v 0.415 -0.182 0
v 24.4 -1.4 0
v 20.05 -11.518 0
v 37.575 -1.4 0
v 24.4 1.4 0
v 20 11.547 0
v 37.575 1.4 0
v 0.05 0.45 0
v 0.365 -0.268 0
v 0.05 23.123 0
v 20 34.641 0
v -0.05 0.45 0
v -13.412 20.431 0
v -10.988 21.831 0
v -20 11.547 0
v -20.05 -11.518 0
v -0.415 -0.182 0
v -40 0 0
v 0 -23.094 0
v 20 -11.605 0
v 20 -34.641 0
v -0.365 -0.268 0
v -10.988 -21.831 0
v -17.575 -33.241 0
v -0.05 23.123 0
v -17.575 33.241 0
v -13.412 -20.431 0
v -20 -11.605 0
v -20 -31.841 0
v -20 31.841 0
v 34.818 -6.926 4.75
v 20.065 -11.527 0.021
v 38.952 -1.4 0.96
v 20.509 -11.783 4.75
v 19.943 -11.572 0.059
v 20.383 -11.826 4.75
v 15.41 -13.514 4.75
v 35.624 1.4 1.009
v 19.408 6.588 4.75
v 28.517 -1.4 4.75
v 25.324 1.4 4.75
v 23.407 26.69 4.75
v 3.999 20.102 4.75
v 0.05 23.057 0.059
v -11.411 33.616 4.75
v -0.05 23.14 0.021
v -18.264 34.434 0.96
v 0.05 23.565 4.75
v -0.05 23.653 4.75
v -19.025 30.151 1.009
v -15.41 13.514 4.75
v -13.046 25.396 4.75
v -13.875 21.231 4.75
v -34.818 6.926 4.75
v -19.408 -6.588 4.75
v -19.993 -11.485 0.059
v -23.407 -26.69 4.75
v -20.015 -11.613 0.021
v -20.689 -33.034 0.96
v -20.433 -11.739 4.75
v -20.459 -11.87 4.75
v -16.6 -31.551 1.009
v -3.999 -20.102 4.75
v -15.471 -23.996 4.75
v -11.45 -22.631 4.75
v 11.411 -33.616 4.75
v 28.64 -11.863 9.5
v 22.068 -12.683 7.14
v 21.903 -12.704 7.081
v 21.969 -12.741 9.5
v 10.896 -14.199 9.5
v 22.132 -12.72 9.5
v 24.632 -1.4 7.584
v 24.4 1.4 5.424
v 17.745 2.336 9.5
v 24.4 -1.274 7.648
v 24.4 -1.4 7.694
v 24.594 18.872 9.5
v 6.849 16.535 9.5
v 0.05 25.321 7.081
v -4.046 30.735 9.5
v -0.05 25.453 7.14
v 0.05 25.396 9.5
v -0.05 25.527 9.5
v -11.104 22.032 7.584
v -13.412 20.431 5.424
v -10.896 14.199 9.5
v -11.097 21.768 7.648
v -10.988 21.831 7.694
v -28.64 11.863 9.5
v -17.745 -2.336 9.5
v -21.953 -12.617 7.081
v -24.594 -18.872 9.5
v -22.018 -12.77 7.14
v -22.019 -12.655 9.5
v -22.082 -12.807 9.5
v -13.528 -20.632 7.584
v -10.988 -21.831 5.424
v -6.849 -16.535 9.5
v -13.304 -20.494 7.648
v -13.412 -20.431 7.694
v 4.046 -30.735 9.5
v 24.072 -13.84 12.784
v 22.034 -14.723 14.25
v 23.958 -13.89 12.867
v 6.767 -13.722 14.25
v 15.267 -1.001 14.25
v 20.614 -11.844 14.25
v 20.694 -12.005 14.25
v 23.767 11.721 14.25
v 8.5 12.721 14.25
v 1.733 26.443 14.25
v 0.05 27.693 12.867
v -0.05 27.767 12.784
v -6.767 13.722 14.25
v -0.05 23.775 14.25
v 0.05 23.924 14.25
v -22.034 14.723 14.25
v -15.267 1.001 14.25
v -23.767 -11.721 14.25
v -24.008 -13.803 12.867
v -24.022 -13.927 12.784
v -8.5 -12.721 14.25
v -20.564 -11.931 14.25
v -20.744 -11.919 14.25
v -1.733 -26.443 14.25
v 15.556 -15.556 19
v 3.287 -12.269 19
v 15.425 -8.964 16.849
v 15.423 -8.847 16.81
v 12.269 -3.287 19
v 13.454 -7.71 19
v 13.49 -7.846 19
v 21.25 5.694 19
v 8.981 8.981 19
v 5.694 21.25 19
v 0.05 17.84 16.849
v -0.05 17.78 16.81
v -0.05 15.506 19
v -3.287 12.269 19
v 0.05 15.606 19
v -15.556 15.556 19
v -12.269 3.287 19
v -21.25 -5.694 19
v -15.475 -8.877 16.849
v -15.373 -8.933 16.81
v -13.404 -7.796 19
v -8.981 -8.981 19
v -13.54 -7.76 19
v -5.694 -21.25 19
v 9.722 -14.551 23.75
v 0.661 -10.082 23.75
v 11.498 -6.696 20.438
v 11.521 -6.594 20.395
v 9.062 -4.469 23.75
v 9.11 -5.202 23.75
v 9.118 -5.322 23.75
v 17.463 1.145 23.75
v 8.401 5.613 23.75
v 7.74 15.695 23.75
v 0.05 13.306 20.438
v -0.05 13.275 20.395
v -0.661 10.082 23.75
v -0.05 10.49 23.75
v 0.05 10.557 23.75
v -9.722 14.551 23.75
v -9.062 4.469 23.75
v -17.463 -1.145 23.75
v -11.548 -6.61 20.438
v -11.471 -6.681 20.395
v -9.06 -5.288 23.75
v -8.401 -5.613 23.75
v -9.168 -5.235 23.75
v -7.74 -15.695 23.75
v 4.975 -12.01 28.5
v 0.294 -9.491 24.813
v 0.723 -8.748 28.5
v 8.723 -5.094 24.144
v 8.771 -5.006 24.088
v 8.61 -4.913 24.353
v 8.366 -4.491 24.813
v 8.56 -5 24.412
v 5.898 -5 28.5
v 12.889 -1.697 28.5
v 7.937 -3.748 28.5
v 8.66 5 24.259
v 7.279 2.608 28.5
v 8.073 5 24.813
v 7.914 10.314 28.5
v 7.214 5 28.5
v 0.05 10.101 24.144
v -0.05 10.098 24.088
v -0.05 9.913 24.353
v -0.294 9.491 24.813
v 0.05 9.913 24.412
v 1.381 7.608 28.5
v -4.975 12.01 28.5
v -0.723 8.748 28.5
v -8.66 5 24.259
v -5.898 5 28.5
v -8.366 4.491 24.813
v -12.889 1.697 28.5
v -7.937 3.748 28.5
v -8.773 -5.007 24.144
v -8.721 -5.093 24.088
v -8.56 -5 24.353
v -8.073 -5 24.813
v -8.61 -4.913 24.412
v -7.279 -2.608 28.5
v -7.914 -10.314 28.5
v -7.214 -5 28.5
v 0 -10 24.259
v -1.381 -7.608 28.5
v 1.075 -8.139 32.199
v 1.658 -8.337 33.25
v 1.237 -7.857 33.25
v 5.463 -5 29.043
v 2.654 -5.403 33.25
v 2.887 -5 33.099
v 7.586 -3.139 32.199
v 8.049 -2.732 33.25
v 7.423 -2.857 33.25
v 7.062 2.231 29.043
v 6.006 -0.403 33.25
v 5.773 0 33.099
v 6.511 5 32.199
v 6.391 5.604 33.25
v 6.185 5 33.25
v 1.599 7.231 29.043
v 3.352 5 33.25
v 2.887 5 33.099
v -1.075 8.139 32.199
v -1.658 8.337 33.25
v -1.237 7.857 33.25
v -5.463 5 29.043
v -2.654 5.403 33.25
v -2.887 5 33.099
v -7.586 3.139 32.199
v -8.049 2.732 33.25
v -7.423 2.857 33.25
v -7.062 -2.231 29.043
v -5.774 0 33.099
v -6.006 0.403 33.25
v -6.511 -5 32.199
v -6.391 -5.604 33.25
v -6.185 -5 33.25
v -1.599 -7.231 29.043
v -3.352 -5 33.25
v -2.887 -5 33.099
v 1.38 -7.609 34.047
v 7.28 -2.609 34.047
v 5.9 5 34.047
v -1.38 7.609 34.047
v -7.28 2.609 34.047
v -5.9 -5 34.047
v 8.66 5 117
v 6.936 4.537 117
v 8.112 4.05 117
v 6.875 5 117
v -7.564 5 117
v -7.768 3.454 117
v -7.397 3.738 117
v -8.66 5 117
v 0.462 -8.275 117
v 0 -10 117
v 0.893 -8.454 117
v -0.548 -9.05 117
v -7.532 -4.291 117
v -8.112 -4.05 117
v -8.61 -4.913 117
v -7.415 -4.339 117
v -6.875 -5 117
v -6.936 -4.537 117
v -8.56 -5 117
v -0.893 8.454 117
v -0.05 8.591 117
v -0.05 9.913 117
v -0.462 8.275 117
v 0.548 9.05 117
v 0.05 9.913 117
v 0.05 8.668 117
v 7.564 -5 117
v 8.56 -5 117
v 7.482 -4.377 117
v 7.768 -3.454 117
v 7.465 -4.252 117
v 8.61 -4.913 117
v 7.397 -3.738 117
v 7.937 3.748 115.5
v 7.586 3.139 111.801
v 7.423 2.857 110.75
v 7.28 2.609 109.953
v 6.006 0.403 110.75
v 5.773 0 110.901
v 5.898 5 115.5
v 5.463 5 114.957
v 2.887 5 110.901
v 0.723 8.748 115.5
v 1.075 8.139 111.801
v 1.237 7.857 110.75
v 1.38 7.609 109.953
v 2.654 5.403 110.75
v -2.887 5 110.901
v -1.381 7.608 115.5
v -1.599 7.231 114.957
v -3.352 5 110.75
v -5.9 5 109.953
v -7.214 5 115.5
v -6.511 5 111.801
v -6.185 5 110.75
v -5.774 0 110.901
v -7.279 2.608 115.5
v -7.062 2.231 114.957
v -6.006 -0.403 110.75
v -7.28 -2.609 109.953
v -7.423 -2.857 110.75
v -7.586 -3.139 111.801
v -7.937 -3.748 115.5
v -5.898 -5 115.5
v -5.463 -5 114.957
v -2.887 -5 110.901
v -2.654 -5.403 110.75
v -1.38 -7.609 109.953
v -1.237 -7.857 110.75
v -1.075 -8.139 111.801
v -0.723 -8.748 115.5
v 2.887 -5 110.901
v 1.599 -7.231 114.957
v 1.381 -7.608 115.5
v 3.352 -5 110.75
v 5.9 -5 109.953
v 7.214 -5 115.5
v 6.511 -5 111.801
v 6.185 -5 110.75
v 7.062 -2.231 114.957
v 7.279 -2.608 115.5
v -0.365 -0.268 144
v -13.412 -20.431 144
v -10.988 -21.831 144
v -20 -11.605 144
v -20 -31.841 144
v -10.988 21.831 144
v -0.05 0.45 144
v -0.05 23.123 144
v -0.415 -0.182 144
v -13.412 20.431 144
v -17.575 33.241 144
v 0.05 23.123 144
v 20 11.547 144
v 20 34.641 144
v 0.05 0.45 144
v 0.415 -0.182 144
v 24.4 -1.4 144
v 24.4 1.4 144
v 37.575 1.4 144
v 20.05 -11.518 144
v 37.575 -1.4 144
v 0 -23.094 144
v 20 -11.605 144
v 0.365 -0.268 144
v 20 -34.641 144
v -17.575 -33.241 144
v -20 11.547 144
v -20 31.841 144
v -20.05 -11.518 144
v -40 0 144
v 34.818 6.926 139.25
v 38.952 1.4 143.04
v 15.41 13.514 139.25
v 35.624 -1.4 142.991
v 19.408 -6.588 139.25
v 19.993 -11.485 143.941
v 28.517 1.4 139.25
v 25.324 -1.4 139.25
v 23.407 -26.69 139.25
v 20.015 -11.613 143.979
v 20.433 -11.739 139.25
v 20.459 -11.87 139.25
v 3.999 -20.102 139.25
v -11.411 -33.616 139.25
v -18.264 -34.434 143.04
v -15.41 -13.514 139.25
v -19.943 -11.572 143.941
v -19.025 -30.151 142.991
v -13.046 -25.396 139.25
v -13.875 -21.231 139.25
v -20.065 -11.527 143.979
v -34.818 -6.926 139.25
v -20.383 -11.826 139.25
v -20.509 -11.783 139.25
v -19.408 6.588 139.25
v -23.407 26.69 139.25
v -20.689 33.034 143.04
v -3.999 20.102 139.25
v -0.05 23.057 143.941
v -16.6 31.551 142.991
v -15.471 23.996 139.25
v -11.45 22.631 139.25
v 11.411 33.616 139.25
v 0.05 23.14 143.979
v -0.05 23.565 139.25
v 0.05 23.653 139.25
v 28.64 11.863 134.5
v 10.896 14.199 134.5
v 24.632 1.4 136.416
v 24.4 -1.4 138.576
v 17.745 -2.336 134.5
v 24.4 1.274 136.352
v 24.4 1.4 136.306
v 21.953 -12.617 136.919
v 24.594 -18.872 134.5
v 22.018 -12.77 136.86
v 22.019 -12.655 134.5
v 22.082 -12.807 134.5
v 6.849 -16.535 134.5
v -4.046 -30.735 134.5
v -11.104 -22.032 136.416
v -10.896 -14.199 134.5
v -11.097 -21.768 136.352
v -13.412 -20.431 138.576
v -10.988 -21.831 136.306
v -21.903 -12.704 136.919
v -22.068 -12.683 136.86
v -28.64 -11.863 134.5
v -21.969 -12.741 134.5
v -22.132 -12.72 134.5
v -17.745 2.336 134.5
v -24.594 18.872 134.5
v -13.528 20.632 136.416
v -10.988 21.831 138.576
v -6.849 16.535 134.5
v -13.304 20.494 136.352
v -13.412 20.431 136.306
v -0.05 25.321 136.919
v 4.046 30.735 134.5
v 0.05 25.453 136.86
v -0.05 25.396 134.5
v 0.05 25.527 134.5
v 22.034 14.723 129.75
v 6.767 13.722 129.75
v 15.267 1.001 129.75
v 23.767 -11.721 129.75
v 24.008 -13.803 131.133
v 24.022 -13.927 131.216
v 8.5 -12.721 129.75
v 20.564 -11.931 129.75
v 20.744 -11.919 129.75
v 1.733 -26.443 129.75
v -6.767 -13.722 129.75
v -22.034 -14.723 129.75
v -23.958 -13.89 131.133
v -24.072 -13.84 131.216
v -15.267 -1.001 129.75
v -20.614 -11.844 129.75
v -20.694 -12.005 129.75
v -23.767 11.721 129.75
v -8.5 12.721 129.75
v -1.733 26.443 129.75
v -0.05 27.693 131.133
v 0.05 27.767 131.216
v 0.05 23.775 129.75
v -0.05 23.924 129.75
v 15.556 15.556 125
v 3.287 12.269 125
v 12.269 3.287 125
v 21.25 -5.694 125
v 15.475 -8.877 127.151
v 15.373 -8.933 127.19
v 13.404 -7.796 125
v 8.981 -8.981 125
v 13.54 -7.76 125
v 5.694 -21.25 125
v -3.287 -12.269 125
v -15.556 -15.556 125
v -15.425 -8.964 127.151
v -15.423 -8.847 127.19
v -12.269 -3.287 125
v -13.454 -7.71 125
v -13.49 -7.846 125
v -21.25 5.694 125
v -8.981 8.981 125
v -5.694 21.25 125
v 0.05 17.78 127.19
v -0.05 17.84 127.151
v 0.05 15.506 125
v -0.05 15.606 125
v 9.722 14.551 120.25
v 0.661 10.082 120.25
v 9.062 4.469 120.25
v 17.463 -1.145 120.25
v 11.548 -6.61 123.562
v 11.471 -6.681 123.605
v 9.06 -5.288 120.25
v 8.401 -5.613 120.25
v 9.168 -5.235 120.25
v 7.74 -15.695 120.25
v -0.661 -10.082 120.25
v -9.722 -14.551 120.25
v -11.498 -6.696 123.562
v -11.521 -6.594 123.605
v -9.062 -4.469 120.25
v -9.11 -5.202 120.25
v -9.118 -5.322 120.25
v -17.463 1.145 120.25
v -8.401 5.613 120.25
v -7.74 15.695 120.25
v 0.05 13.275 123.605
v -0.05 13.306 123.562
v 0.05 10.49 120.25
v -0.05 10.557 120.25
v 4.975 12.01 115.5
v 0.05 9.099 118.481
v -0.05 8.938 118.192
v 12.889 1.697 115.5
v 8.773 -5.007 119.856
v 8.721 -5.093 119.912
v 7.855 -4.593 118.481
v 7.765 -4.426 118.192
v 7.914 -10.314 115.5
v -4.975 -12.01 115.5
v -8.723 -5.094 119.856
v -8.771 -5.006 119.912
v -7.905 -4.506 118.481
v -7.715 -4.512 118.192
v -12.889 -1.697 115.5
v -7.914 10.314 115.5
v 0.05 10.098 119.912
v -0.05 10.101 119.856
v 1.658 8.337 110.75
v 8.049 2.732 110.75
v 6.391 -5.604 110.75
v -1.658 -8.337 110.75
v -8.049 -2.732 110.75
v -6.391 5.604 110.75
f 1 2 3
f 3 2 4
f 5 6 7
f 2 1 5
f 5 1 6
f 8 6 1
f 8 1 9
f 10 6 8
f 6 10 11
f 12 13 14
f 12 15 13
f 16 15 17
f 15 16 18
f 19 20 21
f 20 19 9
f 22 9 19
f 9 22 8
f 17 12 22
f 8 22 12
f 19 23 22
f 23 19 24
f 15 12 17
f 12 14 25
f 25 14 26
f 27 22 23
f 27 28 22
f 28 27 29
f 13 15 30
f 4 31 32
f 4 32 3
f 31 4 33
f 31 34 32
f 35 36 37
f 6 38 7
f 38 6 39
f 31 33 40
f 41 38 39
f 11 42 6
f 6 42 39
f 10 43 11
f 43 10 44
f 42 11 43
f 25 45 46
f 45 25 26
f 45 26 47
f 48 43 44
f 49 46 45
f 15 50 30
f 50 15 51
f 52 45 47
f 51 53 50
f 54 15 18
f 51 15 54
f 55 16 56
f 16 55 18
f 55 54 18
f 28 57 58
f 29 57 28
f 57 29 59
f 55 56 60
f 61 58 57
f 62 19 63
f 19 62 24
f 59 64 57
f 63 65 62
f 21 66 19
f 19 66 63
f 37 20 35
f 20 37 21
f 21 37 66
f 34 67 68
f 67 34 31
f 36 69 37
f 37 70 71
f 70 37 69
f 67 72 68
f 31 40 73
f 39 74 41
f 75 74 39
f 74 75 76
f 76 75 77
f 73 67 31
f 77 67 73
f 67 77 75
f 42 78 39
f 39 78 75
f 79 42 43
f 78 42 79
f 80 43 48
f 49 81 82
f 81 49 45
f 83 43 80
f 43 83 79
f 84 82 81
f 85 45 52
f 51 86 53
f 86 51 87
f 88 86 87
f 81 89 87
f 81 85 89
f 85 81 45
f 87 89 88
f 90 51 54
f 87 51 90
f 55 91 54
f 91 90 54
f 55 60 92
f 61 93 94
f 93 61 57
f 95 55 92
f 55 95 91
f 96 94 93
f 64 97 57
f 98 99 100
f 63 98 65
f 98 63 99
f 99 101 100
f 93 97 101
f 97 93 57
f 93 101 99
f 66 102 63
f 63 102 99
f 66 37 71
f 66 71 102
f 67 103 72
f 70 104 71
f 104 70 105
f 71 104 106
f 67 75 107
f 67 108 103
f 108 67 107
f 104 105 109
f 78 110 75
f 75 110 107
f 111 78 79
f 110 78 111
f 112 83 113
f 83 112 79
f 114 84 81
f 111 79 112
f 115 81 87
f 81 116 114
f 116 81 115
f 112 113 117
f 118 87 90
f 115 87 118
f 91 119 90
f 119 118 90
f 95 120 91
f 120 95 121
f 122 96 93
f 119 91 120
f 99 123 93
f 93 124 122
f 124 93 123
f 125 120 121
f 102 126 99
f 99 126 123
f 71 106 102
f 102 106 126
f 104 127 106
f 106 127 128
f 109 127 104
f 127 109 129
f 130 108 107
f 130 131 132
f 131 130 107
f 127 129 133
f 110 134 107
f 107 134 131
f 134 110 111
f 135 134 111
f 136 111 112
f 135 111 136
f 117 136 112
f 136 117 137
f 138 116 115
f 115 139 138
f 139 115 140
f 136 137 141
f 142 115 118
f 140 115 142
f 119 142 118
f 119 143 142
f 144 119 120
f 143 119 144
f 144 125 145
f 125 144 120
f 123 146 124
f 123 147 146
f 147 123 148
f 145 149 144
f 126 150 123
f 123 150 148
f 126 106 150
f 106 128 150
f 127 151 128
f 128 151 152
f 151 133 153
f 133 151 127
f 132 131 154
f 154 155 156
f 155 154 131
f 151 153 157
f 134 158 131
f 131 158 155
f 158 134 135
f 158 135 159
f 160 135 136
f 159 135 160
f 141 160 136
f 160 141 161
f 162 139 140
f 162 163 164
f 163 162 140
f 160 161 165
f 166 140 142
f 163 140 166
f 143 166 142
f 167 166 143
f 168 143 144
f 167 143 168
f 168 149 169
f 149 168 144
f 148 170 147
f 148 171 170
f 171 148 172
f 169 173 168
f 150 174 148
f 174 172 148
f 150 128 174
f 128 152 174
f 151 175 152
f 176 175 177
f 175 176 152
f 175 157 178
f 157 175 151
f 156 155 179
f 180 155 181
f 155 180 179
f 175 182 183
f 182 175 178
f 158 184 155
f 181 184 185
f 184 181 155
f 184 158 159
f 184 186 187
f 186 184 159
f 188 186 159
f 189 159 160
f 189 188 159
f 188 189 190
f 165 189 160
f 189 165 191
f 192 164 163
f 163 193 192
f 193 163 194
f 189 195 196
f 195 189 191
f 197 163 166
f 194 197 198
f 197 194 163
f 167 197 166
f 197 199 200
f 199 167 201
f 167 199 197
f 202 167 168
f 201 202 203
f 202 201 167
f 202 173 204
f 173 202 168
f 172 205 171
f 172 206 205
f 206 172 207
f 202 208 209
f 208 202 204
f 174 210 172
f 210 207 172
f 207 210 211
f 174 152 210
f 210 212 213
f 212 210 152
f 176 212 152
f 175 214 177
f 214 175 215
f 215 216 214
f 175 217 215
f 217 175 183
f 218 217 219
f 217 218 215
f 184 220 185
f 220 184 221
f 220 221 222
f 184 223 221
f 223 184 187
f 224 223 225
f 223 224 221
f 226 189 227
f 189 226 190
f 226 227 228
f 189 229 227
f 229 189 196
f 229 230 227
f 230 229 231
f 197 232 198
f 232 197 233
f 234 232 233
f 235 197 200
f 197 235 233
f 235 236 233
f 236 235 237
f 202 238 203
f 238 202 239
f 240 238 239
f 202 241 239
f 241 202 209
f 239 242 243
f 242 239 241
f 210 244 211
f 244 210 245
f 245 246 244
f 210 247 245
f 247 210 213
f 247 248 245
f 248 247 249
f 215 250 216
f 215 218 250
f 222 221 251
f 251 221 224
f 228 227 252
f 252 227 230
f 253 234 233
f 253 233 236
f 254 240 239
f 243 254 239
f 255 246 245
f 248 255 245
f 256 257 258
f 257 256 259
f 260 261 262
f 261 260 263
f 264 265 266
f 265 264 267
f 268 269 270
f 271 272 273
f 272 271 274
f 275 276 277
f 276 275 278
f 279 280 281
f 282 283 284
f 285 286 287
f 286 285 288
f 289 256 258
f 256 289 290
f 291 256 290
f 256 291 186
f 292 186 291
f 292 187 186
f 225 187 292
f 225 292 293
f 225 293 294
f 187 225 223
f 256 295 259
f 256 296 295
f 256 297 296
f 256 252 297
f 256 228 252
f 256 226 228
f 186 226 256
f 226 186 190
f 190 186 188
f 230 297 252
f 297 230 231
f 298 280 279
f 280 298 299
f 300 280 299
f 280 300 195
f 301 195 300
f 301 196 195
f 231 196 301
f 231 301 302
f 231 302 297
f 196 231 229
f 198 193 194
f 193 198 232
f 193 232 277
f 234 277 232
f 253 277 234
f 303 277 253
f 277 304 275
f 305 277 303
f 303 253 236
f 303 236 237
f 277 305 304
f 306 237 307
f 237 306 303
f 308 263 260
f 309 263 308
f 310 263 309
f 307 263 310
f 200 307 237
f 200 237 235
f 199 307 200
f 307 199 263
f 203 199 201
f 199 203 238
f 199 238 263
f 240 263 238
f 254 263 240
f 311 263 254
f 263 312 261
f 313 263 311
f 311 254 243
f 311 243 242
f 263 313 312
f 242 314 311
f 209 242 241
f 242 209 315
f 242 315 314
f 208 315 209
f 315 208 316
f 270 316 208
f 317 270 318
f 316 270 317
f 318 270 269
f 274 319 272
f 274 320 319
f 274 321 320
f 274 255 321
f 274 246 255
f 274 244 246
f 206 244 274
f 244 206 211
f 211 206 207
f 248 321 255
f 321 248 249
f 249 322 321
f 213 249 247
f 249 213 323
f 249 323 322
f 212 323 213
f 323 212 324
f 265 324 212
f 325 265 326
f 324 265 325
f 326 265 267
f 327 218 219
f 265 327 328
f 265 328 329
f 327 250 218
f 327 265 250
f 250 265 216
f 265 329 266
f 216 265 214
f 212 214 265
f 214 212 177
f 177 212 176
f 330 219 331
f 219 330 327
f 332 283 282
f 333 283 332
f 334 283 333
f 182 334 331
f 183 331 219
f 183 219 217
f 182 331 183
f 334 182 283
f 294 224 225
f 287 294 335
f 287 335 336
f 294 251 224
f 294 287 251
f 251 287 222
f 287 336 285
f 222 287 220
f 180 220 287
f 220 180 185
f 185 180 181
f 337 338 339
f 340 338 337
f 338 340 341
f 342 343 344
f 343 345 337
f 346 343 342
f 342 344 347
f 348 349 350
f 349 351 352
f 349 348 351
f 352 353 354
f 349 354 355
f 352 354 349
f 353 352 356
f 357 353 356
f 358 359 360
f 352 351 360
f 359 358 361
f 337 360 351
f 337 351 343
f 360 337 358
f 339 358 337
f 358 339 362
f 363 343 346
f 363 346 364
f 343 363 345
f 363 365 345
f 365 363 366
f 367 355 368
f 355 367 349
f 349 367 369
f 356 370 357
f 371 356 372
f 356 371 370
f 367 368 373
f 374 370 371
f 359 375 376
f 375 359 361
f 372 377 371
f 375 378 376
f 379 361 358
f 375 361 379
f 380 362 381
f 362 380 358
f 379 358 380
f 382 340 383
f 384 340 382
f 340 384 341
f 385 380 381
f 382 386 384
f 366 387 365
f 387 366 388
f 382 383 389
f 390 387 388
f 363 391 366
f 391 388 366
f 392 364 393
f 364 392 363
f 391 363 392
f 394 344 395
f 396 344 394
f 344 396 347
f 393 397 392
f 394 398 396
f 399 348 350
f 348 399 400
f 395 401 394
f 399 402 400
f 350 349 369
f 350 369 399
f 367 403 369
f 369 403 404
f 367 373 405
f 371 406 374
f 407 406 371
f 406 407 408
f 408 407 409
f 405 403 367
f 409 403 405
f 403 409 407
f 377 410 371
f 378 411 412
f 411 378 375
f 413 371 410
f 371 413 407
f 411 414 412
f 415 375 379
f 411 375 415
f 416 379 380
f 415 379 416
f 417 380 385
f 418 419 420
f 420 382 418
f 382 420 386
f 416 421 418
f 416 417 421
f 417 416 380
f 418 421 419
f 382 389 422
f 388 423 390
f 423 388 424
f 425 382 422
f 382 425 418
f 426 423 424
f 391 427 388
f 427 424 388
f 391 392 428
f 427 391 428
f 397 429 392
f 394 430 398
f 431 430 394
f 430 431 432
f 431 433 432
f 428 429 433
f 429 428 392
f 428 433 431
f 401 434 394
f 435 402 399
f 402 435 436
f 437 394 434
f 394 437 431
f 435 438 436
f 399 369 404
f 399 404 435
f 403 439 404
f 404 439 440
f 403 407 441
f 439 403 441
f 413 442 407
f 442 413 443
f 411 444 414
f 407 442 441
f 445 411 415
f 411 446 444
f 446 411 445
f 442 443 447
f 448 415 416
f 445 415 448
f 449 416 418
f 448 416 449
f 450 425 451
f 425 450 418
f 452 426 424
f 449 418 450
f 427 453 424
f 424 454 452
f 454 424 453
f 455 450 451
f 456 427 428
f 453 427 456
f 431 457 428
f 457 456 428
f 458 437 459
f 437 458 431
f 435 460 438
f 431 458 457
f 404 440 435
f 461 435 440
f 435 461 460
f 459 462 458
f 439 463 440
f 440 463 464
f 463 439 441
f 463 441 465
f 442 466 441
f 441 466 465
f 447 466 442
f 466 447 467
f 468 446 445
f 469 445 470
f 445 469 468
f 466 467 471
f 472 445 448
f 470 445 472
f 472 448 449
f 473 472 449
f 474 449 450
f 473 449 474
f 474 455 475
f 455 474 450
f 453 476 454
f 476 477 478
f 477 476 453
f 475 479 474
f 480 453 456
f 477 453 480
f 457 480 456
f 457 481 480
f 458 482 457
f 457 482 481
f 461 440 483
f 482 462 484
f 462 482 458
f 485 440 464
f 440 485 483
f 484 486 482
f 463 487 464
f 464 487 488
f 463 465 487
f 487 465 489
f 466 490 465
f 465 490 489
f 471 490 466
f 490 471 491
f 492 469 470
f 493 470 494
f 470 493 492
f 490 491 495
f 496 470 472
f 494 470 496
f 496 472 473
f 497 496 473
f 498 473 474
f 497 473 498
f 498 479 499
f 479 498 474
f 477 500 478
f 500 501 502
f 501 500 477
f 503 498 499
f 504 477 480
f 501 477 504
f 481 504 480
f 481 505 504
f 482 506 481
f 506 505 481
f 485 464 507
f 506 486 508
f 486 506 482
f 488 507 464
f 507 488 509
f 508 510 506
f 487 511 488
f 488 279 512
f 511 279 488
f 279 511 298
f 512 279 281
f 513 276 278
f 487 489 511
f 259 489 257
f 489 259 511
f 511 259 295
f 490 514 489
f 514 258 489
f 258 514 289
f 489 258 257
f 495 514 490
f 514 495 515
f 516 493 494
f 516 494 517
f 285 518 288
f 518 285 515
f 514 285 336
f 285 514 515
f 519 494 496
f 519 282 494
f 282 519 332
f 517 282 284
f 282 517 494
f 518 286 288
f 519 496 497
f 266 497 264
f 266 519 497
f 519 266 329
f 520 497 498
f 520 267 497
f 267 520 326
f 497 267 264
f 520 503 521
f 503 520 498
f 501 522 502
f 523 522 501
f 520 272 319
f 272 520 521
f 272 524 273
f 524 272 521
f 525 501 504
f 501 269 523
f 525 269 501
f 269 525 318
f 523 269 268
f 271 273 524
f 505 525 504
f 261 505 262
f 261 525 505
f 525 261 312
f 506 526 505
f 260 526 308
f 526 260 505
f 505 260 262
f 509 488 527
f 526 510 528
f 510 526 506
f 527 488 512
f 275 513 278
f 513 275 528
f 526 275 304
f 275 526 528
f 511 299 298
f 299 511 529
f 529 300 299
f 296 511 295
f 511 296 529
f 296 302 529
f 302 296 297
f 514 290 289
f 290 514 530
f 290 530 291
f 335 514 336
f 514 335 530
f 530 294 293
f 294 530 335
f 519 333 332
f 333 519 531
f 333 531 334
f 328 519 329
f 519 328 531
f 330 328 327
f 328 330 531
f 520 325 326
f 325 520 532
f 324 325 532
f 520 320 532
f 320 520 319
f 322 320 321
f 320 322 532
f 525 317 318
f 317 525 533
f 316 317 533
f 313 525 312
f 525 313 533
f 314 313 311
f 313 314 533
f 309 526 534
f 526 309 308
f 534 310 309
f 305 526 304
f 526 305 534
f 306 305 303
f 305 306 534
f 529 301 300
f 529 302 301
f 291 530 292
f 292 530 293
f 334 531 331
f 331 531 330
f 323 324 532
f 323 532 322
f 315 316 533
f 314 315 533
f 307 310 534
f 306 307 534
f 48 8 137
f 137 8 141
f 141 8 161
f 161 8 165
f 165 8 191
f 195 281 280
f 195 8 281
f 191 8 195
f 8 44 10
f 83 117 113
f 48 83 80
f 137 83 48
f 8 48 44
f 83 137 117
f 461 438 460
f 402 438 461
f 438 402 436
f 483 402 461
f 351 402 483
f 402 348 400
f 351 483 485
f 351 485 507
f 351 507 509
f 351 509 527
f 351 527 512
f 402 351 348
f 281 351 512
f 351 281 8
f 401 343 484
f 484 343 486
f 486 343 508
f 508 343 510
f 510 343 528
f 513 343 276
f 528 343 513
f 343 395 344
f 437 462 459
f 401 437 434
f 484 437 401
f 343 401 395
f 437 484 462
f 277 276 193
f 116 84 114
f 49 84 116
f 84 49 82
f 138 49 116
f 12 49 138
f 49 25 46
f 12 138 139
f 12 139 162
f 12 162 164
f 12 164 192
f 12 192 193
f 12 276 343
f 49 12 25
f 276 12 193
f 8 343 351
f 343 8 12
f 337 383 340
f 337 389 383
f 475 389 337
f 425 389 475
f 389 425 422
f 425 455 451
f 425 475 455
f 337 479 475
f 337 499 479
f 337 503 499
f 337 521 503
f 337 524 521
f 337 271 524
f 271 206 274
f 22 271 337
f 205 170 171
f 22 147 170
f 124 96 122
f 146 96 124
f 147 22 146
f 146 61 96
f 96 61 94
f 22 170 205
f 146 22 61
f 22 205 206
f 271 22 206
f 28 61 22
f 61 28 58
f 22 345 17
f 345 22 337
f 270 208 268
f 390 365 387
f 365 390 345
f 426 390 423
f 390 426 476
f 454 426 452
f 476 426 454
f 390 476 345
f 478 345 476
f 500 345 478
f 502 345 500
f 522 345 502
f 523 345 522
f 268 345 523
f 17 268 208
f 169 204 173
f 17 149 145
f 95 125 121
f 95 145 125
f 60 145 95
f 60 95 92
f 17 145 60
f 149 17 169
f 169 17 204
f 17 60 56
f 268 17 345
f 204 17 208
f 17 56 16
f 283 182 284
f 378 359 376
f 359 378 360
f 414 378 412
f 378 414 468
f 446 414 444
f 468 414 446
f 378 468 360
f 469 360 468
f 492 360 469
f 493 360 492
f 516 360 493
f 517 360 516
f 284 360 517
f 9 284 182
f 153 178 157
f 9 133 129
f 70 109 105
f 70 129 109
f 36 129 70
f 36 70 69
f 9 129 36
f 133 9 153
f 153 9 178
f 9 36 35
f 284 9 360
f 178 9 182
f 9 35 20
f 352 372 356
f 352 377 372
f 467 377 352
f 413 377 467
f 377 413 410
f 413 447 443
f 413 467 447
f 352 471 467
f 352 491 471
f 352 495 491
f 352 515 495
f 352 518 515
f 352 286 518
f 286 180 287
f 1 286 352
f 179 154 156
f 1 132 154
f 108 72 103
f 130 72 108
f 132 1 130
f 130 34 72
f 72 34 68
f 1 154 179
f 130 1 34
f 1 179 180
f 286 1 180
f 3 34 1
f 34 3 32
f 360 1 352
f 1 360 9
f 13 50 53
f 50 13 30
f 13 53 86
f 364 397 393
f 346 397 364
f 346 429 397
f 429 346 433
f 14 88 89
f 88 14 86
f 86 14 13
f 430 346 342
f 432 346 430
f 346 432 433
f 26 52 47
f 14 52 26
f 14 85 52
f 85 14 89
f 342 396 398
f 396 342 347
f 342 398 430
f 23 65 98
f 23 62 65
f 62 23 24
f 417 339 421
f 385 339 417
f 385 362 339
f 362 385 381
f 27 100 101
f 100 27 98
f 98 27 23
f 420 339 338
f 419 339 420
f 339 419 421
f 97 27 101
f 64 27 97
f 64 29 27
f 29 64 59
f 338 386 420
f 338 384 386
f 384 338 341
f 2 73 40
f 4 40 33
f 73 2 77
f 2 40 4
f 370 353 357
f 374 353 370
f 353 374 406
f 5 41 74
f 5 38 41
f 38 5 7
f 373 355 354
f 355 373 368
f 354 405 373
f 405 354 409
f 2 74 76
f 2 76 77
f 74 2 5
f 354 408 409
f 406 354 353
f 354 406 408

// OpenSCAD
R1 = 40;
SCALE = 0.25;
HSCALE = 0.8;
R2 = R1 * SCALE;
H = 80;

echo(R2);

module section(r) {
  circle(r = r, $fn = 3);

  rotate([0, 0, 60]) 
    circle(r = r, $fn = 3);
}

module axel(r) {
  circle(r = r, $fn = 3);

  rotate([0, 0, 60]) 
    circle(r = r, $fn = 3);
}

difference() {
  union() {
    r1 = R1 * HSCALE;
    
    linear_extrude(r1 + 6, twist = 90, scale = 0.1, slices = 8)
      section(R1);

    translate([0, 0, 5]) rotate([0, 0, 30])
      linear_extrude(H + r1, twist = 0, slices = 16) 
        axel(R2);

    translate([0, 0, r1 * 2 + H])
      rotate([180, 0, 0])
        linear_extrude(r1 + 6, twist = 90, scale = 0.1, slices = 8)
          section(R1);
  } 

  for (i = [0 : 1 : 2])
    rotate([0, 0, i * 120])
      translate([-0.05, 0.45, -0.5]) {
        cube([0.1, R1, R1 + H + R1 + 1]);
      }
      
      
  for (i = [0 : 1 : 2])
    rotate([0, 0, 30 + i * 120])
      translate([-1.4, R1 * .61, -0.5]) {
        cube([2.8, R1 * .4, R1 + H + R1 + 1]);
      }
      
}

*intersection() {
  union() {
    r1 = R1 * HSCALE;
    
    linear_extrude(r1, twist = 0, scale = SCALE, slices = 10)
      section(R1);

    translate([0, 0, r1])
      linear_extrude(H, twist = 0, slices = 18) 
        section(R2);

    translate([0, 0, r1 * 2 + H])
      rotate([180, 0, 0])
        linear_extrude(r1, twist = 0, scale = SCALE, slices = 10)
          section(R1);
  } 

  for (i = [0 : 1 : 7])
    rotate([0, 0, i * 45])
      translate([-0.45, 0, -0.5]) {
        cube([0.9, R1 * 1.01, R1 + H + R1 + 1]);
      }
      
      

      
}

*difference() {
  cylinder(h = R1 * HSCALE * 2 + H, r = R2 * 0.8, $fn = 8);
  
  *translate([0, 0, -0.5]) cylinder(h = R1 * HSCALE * 2 + H + 1, r = R2 - 0.1, $fn = 8);
}
